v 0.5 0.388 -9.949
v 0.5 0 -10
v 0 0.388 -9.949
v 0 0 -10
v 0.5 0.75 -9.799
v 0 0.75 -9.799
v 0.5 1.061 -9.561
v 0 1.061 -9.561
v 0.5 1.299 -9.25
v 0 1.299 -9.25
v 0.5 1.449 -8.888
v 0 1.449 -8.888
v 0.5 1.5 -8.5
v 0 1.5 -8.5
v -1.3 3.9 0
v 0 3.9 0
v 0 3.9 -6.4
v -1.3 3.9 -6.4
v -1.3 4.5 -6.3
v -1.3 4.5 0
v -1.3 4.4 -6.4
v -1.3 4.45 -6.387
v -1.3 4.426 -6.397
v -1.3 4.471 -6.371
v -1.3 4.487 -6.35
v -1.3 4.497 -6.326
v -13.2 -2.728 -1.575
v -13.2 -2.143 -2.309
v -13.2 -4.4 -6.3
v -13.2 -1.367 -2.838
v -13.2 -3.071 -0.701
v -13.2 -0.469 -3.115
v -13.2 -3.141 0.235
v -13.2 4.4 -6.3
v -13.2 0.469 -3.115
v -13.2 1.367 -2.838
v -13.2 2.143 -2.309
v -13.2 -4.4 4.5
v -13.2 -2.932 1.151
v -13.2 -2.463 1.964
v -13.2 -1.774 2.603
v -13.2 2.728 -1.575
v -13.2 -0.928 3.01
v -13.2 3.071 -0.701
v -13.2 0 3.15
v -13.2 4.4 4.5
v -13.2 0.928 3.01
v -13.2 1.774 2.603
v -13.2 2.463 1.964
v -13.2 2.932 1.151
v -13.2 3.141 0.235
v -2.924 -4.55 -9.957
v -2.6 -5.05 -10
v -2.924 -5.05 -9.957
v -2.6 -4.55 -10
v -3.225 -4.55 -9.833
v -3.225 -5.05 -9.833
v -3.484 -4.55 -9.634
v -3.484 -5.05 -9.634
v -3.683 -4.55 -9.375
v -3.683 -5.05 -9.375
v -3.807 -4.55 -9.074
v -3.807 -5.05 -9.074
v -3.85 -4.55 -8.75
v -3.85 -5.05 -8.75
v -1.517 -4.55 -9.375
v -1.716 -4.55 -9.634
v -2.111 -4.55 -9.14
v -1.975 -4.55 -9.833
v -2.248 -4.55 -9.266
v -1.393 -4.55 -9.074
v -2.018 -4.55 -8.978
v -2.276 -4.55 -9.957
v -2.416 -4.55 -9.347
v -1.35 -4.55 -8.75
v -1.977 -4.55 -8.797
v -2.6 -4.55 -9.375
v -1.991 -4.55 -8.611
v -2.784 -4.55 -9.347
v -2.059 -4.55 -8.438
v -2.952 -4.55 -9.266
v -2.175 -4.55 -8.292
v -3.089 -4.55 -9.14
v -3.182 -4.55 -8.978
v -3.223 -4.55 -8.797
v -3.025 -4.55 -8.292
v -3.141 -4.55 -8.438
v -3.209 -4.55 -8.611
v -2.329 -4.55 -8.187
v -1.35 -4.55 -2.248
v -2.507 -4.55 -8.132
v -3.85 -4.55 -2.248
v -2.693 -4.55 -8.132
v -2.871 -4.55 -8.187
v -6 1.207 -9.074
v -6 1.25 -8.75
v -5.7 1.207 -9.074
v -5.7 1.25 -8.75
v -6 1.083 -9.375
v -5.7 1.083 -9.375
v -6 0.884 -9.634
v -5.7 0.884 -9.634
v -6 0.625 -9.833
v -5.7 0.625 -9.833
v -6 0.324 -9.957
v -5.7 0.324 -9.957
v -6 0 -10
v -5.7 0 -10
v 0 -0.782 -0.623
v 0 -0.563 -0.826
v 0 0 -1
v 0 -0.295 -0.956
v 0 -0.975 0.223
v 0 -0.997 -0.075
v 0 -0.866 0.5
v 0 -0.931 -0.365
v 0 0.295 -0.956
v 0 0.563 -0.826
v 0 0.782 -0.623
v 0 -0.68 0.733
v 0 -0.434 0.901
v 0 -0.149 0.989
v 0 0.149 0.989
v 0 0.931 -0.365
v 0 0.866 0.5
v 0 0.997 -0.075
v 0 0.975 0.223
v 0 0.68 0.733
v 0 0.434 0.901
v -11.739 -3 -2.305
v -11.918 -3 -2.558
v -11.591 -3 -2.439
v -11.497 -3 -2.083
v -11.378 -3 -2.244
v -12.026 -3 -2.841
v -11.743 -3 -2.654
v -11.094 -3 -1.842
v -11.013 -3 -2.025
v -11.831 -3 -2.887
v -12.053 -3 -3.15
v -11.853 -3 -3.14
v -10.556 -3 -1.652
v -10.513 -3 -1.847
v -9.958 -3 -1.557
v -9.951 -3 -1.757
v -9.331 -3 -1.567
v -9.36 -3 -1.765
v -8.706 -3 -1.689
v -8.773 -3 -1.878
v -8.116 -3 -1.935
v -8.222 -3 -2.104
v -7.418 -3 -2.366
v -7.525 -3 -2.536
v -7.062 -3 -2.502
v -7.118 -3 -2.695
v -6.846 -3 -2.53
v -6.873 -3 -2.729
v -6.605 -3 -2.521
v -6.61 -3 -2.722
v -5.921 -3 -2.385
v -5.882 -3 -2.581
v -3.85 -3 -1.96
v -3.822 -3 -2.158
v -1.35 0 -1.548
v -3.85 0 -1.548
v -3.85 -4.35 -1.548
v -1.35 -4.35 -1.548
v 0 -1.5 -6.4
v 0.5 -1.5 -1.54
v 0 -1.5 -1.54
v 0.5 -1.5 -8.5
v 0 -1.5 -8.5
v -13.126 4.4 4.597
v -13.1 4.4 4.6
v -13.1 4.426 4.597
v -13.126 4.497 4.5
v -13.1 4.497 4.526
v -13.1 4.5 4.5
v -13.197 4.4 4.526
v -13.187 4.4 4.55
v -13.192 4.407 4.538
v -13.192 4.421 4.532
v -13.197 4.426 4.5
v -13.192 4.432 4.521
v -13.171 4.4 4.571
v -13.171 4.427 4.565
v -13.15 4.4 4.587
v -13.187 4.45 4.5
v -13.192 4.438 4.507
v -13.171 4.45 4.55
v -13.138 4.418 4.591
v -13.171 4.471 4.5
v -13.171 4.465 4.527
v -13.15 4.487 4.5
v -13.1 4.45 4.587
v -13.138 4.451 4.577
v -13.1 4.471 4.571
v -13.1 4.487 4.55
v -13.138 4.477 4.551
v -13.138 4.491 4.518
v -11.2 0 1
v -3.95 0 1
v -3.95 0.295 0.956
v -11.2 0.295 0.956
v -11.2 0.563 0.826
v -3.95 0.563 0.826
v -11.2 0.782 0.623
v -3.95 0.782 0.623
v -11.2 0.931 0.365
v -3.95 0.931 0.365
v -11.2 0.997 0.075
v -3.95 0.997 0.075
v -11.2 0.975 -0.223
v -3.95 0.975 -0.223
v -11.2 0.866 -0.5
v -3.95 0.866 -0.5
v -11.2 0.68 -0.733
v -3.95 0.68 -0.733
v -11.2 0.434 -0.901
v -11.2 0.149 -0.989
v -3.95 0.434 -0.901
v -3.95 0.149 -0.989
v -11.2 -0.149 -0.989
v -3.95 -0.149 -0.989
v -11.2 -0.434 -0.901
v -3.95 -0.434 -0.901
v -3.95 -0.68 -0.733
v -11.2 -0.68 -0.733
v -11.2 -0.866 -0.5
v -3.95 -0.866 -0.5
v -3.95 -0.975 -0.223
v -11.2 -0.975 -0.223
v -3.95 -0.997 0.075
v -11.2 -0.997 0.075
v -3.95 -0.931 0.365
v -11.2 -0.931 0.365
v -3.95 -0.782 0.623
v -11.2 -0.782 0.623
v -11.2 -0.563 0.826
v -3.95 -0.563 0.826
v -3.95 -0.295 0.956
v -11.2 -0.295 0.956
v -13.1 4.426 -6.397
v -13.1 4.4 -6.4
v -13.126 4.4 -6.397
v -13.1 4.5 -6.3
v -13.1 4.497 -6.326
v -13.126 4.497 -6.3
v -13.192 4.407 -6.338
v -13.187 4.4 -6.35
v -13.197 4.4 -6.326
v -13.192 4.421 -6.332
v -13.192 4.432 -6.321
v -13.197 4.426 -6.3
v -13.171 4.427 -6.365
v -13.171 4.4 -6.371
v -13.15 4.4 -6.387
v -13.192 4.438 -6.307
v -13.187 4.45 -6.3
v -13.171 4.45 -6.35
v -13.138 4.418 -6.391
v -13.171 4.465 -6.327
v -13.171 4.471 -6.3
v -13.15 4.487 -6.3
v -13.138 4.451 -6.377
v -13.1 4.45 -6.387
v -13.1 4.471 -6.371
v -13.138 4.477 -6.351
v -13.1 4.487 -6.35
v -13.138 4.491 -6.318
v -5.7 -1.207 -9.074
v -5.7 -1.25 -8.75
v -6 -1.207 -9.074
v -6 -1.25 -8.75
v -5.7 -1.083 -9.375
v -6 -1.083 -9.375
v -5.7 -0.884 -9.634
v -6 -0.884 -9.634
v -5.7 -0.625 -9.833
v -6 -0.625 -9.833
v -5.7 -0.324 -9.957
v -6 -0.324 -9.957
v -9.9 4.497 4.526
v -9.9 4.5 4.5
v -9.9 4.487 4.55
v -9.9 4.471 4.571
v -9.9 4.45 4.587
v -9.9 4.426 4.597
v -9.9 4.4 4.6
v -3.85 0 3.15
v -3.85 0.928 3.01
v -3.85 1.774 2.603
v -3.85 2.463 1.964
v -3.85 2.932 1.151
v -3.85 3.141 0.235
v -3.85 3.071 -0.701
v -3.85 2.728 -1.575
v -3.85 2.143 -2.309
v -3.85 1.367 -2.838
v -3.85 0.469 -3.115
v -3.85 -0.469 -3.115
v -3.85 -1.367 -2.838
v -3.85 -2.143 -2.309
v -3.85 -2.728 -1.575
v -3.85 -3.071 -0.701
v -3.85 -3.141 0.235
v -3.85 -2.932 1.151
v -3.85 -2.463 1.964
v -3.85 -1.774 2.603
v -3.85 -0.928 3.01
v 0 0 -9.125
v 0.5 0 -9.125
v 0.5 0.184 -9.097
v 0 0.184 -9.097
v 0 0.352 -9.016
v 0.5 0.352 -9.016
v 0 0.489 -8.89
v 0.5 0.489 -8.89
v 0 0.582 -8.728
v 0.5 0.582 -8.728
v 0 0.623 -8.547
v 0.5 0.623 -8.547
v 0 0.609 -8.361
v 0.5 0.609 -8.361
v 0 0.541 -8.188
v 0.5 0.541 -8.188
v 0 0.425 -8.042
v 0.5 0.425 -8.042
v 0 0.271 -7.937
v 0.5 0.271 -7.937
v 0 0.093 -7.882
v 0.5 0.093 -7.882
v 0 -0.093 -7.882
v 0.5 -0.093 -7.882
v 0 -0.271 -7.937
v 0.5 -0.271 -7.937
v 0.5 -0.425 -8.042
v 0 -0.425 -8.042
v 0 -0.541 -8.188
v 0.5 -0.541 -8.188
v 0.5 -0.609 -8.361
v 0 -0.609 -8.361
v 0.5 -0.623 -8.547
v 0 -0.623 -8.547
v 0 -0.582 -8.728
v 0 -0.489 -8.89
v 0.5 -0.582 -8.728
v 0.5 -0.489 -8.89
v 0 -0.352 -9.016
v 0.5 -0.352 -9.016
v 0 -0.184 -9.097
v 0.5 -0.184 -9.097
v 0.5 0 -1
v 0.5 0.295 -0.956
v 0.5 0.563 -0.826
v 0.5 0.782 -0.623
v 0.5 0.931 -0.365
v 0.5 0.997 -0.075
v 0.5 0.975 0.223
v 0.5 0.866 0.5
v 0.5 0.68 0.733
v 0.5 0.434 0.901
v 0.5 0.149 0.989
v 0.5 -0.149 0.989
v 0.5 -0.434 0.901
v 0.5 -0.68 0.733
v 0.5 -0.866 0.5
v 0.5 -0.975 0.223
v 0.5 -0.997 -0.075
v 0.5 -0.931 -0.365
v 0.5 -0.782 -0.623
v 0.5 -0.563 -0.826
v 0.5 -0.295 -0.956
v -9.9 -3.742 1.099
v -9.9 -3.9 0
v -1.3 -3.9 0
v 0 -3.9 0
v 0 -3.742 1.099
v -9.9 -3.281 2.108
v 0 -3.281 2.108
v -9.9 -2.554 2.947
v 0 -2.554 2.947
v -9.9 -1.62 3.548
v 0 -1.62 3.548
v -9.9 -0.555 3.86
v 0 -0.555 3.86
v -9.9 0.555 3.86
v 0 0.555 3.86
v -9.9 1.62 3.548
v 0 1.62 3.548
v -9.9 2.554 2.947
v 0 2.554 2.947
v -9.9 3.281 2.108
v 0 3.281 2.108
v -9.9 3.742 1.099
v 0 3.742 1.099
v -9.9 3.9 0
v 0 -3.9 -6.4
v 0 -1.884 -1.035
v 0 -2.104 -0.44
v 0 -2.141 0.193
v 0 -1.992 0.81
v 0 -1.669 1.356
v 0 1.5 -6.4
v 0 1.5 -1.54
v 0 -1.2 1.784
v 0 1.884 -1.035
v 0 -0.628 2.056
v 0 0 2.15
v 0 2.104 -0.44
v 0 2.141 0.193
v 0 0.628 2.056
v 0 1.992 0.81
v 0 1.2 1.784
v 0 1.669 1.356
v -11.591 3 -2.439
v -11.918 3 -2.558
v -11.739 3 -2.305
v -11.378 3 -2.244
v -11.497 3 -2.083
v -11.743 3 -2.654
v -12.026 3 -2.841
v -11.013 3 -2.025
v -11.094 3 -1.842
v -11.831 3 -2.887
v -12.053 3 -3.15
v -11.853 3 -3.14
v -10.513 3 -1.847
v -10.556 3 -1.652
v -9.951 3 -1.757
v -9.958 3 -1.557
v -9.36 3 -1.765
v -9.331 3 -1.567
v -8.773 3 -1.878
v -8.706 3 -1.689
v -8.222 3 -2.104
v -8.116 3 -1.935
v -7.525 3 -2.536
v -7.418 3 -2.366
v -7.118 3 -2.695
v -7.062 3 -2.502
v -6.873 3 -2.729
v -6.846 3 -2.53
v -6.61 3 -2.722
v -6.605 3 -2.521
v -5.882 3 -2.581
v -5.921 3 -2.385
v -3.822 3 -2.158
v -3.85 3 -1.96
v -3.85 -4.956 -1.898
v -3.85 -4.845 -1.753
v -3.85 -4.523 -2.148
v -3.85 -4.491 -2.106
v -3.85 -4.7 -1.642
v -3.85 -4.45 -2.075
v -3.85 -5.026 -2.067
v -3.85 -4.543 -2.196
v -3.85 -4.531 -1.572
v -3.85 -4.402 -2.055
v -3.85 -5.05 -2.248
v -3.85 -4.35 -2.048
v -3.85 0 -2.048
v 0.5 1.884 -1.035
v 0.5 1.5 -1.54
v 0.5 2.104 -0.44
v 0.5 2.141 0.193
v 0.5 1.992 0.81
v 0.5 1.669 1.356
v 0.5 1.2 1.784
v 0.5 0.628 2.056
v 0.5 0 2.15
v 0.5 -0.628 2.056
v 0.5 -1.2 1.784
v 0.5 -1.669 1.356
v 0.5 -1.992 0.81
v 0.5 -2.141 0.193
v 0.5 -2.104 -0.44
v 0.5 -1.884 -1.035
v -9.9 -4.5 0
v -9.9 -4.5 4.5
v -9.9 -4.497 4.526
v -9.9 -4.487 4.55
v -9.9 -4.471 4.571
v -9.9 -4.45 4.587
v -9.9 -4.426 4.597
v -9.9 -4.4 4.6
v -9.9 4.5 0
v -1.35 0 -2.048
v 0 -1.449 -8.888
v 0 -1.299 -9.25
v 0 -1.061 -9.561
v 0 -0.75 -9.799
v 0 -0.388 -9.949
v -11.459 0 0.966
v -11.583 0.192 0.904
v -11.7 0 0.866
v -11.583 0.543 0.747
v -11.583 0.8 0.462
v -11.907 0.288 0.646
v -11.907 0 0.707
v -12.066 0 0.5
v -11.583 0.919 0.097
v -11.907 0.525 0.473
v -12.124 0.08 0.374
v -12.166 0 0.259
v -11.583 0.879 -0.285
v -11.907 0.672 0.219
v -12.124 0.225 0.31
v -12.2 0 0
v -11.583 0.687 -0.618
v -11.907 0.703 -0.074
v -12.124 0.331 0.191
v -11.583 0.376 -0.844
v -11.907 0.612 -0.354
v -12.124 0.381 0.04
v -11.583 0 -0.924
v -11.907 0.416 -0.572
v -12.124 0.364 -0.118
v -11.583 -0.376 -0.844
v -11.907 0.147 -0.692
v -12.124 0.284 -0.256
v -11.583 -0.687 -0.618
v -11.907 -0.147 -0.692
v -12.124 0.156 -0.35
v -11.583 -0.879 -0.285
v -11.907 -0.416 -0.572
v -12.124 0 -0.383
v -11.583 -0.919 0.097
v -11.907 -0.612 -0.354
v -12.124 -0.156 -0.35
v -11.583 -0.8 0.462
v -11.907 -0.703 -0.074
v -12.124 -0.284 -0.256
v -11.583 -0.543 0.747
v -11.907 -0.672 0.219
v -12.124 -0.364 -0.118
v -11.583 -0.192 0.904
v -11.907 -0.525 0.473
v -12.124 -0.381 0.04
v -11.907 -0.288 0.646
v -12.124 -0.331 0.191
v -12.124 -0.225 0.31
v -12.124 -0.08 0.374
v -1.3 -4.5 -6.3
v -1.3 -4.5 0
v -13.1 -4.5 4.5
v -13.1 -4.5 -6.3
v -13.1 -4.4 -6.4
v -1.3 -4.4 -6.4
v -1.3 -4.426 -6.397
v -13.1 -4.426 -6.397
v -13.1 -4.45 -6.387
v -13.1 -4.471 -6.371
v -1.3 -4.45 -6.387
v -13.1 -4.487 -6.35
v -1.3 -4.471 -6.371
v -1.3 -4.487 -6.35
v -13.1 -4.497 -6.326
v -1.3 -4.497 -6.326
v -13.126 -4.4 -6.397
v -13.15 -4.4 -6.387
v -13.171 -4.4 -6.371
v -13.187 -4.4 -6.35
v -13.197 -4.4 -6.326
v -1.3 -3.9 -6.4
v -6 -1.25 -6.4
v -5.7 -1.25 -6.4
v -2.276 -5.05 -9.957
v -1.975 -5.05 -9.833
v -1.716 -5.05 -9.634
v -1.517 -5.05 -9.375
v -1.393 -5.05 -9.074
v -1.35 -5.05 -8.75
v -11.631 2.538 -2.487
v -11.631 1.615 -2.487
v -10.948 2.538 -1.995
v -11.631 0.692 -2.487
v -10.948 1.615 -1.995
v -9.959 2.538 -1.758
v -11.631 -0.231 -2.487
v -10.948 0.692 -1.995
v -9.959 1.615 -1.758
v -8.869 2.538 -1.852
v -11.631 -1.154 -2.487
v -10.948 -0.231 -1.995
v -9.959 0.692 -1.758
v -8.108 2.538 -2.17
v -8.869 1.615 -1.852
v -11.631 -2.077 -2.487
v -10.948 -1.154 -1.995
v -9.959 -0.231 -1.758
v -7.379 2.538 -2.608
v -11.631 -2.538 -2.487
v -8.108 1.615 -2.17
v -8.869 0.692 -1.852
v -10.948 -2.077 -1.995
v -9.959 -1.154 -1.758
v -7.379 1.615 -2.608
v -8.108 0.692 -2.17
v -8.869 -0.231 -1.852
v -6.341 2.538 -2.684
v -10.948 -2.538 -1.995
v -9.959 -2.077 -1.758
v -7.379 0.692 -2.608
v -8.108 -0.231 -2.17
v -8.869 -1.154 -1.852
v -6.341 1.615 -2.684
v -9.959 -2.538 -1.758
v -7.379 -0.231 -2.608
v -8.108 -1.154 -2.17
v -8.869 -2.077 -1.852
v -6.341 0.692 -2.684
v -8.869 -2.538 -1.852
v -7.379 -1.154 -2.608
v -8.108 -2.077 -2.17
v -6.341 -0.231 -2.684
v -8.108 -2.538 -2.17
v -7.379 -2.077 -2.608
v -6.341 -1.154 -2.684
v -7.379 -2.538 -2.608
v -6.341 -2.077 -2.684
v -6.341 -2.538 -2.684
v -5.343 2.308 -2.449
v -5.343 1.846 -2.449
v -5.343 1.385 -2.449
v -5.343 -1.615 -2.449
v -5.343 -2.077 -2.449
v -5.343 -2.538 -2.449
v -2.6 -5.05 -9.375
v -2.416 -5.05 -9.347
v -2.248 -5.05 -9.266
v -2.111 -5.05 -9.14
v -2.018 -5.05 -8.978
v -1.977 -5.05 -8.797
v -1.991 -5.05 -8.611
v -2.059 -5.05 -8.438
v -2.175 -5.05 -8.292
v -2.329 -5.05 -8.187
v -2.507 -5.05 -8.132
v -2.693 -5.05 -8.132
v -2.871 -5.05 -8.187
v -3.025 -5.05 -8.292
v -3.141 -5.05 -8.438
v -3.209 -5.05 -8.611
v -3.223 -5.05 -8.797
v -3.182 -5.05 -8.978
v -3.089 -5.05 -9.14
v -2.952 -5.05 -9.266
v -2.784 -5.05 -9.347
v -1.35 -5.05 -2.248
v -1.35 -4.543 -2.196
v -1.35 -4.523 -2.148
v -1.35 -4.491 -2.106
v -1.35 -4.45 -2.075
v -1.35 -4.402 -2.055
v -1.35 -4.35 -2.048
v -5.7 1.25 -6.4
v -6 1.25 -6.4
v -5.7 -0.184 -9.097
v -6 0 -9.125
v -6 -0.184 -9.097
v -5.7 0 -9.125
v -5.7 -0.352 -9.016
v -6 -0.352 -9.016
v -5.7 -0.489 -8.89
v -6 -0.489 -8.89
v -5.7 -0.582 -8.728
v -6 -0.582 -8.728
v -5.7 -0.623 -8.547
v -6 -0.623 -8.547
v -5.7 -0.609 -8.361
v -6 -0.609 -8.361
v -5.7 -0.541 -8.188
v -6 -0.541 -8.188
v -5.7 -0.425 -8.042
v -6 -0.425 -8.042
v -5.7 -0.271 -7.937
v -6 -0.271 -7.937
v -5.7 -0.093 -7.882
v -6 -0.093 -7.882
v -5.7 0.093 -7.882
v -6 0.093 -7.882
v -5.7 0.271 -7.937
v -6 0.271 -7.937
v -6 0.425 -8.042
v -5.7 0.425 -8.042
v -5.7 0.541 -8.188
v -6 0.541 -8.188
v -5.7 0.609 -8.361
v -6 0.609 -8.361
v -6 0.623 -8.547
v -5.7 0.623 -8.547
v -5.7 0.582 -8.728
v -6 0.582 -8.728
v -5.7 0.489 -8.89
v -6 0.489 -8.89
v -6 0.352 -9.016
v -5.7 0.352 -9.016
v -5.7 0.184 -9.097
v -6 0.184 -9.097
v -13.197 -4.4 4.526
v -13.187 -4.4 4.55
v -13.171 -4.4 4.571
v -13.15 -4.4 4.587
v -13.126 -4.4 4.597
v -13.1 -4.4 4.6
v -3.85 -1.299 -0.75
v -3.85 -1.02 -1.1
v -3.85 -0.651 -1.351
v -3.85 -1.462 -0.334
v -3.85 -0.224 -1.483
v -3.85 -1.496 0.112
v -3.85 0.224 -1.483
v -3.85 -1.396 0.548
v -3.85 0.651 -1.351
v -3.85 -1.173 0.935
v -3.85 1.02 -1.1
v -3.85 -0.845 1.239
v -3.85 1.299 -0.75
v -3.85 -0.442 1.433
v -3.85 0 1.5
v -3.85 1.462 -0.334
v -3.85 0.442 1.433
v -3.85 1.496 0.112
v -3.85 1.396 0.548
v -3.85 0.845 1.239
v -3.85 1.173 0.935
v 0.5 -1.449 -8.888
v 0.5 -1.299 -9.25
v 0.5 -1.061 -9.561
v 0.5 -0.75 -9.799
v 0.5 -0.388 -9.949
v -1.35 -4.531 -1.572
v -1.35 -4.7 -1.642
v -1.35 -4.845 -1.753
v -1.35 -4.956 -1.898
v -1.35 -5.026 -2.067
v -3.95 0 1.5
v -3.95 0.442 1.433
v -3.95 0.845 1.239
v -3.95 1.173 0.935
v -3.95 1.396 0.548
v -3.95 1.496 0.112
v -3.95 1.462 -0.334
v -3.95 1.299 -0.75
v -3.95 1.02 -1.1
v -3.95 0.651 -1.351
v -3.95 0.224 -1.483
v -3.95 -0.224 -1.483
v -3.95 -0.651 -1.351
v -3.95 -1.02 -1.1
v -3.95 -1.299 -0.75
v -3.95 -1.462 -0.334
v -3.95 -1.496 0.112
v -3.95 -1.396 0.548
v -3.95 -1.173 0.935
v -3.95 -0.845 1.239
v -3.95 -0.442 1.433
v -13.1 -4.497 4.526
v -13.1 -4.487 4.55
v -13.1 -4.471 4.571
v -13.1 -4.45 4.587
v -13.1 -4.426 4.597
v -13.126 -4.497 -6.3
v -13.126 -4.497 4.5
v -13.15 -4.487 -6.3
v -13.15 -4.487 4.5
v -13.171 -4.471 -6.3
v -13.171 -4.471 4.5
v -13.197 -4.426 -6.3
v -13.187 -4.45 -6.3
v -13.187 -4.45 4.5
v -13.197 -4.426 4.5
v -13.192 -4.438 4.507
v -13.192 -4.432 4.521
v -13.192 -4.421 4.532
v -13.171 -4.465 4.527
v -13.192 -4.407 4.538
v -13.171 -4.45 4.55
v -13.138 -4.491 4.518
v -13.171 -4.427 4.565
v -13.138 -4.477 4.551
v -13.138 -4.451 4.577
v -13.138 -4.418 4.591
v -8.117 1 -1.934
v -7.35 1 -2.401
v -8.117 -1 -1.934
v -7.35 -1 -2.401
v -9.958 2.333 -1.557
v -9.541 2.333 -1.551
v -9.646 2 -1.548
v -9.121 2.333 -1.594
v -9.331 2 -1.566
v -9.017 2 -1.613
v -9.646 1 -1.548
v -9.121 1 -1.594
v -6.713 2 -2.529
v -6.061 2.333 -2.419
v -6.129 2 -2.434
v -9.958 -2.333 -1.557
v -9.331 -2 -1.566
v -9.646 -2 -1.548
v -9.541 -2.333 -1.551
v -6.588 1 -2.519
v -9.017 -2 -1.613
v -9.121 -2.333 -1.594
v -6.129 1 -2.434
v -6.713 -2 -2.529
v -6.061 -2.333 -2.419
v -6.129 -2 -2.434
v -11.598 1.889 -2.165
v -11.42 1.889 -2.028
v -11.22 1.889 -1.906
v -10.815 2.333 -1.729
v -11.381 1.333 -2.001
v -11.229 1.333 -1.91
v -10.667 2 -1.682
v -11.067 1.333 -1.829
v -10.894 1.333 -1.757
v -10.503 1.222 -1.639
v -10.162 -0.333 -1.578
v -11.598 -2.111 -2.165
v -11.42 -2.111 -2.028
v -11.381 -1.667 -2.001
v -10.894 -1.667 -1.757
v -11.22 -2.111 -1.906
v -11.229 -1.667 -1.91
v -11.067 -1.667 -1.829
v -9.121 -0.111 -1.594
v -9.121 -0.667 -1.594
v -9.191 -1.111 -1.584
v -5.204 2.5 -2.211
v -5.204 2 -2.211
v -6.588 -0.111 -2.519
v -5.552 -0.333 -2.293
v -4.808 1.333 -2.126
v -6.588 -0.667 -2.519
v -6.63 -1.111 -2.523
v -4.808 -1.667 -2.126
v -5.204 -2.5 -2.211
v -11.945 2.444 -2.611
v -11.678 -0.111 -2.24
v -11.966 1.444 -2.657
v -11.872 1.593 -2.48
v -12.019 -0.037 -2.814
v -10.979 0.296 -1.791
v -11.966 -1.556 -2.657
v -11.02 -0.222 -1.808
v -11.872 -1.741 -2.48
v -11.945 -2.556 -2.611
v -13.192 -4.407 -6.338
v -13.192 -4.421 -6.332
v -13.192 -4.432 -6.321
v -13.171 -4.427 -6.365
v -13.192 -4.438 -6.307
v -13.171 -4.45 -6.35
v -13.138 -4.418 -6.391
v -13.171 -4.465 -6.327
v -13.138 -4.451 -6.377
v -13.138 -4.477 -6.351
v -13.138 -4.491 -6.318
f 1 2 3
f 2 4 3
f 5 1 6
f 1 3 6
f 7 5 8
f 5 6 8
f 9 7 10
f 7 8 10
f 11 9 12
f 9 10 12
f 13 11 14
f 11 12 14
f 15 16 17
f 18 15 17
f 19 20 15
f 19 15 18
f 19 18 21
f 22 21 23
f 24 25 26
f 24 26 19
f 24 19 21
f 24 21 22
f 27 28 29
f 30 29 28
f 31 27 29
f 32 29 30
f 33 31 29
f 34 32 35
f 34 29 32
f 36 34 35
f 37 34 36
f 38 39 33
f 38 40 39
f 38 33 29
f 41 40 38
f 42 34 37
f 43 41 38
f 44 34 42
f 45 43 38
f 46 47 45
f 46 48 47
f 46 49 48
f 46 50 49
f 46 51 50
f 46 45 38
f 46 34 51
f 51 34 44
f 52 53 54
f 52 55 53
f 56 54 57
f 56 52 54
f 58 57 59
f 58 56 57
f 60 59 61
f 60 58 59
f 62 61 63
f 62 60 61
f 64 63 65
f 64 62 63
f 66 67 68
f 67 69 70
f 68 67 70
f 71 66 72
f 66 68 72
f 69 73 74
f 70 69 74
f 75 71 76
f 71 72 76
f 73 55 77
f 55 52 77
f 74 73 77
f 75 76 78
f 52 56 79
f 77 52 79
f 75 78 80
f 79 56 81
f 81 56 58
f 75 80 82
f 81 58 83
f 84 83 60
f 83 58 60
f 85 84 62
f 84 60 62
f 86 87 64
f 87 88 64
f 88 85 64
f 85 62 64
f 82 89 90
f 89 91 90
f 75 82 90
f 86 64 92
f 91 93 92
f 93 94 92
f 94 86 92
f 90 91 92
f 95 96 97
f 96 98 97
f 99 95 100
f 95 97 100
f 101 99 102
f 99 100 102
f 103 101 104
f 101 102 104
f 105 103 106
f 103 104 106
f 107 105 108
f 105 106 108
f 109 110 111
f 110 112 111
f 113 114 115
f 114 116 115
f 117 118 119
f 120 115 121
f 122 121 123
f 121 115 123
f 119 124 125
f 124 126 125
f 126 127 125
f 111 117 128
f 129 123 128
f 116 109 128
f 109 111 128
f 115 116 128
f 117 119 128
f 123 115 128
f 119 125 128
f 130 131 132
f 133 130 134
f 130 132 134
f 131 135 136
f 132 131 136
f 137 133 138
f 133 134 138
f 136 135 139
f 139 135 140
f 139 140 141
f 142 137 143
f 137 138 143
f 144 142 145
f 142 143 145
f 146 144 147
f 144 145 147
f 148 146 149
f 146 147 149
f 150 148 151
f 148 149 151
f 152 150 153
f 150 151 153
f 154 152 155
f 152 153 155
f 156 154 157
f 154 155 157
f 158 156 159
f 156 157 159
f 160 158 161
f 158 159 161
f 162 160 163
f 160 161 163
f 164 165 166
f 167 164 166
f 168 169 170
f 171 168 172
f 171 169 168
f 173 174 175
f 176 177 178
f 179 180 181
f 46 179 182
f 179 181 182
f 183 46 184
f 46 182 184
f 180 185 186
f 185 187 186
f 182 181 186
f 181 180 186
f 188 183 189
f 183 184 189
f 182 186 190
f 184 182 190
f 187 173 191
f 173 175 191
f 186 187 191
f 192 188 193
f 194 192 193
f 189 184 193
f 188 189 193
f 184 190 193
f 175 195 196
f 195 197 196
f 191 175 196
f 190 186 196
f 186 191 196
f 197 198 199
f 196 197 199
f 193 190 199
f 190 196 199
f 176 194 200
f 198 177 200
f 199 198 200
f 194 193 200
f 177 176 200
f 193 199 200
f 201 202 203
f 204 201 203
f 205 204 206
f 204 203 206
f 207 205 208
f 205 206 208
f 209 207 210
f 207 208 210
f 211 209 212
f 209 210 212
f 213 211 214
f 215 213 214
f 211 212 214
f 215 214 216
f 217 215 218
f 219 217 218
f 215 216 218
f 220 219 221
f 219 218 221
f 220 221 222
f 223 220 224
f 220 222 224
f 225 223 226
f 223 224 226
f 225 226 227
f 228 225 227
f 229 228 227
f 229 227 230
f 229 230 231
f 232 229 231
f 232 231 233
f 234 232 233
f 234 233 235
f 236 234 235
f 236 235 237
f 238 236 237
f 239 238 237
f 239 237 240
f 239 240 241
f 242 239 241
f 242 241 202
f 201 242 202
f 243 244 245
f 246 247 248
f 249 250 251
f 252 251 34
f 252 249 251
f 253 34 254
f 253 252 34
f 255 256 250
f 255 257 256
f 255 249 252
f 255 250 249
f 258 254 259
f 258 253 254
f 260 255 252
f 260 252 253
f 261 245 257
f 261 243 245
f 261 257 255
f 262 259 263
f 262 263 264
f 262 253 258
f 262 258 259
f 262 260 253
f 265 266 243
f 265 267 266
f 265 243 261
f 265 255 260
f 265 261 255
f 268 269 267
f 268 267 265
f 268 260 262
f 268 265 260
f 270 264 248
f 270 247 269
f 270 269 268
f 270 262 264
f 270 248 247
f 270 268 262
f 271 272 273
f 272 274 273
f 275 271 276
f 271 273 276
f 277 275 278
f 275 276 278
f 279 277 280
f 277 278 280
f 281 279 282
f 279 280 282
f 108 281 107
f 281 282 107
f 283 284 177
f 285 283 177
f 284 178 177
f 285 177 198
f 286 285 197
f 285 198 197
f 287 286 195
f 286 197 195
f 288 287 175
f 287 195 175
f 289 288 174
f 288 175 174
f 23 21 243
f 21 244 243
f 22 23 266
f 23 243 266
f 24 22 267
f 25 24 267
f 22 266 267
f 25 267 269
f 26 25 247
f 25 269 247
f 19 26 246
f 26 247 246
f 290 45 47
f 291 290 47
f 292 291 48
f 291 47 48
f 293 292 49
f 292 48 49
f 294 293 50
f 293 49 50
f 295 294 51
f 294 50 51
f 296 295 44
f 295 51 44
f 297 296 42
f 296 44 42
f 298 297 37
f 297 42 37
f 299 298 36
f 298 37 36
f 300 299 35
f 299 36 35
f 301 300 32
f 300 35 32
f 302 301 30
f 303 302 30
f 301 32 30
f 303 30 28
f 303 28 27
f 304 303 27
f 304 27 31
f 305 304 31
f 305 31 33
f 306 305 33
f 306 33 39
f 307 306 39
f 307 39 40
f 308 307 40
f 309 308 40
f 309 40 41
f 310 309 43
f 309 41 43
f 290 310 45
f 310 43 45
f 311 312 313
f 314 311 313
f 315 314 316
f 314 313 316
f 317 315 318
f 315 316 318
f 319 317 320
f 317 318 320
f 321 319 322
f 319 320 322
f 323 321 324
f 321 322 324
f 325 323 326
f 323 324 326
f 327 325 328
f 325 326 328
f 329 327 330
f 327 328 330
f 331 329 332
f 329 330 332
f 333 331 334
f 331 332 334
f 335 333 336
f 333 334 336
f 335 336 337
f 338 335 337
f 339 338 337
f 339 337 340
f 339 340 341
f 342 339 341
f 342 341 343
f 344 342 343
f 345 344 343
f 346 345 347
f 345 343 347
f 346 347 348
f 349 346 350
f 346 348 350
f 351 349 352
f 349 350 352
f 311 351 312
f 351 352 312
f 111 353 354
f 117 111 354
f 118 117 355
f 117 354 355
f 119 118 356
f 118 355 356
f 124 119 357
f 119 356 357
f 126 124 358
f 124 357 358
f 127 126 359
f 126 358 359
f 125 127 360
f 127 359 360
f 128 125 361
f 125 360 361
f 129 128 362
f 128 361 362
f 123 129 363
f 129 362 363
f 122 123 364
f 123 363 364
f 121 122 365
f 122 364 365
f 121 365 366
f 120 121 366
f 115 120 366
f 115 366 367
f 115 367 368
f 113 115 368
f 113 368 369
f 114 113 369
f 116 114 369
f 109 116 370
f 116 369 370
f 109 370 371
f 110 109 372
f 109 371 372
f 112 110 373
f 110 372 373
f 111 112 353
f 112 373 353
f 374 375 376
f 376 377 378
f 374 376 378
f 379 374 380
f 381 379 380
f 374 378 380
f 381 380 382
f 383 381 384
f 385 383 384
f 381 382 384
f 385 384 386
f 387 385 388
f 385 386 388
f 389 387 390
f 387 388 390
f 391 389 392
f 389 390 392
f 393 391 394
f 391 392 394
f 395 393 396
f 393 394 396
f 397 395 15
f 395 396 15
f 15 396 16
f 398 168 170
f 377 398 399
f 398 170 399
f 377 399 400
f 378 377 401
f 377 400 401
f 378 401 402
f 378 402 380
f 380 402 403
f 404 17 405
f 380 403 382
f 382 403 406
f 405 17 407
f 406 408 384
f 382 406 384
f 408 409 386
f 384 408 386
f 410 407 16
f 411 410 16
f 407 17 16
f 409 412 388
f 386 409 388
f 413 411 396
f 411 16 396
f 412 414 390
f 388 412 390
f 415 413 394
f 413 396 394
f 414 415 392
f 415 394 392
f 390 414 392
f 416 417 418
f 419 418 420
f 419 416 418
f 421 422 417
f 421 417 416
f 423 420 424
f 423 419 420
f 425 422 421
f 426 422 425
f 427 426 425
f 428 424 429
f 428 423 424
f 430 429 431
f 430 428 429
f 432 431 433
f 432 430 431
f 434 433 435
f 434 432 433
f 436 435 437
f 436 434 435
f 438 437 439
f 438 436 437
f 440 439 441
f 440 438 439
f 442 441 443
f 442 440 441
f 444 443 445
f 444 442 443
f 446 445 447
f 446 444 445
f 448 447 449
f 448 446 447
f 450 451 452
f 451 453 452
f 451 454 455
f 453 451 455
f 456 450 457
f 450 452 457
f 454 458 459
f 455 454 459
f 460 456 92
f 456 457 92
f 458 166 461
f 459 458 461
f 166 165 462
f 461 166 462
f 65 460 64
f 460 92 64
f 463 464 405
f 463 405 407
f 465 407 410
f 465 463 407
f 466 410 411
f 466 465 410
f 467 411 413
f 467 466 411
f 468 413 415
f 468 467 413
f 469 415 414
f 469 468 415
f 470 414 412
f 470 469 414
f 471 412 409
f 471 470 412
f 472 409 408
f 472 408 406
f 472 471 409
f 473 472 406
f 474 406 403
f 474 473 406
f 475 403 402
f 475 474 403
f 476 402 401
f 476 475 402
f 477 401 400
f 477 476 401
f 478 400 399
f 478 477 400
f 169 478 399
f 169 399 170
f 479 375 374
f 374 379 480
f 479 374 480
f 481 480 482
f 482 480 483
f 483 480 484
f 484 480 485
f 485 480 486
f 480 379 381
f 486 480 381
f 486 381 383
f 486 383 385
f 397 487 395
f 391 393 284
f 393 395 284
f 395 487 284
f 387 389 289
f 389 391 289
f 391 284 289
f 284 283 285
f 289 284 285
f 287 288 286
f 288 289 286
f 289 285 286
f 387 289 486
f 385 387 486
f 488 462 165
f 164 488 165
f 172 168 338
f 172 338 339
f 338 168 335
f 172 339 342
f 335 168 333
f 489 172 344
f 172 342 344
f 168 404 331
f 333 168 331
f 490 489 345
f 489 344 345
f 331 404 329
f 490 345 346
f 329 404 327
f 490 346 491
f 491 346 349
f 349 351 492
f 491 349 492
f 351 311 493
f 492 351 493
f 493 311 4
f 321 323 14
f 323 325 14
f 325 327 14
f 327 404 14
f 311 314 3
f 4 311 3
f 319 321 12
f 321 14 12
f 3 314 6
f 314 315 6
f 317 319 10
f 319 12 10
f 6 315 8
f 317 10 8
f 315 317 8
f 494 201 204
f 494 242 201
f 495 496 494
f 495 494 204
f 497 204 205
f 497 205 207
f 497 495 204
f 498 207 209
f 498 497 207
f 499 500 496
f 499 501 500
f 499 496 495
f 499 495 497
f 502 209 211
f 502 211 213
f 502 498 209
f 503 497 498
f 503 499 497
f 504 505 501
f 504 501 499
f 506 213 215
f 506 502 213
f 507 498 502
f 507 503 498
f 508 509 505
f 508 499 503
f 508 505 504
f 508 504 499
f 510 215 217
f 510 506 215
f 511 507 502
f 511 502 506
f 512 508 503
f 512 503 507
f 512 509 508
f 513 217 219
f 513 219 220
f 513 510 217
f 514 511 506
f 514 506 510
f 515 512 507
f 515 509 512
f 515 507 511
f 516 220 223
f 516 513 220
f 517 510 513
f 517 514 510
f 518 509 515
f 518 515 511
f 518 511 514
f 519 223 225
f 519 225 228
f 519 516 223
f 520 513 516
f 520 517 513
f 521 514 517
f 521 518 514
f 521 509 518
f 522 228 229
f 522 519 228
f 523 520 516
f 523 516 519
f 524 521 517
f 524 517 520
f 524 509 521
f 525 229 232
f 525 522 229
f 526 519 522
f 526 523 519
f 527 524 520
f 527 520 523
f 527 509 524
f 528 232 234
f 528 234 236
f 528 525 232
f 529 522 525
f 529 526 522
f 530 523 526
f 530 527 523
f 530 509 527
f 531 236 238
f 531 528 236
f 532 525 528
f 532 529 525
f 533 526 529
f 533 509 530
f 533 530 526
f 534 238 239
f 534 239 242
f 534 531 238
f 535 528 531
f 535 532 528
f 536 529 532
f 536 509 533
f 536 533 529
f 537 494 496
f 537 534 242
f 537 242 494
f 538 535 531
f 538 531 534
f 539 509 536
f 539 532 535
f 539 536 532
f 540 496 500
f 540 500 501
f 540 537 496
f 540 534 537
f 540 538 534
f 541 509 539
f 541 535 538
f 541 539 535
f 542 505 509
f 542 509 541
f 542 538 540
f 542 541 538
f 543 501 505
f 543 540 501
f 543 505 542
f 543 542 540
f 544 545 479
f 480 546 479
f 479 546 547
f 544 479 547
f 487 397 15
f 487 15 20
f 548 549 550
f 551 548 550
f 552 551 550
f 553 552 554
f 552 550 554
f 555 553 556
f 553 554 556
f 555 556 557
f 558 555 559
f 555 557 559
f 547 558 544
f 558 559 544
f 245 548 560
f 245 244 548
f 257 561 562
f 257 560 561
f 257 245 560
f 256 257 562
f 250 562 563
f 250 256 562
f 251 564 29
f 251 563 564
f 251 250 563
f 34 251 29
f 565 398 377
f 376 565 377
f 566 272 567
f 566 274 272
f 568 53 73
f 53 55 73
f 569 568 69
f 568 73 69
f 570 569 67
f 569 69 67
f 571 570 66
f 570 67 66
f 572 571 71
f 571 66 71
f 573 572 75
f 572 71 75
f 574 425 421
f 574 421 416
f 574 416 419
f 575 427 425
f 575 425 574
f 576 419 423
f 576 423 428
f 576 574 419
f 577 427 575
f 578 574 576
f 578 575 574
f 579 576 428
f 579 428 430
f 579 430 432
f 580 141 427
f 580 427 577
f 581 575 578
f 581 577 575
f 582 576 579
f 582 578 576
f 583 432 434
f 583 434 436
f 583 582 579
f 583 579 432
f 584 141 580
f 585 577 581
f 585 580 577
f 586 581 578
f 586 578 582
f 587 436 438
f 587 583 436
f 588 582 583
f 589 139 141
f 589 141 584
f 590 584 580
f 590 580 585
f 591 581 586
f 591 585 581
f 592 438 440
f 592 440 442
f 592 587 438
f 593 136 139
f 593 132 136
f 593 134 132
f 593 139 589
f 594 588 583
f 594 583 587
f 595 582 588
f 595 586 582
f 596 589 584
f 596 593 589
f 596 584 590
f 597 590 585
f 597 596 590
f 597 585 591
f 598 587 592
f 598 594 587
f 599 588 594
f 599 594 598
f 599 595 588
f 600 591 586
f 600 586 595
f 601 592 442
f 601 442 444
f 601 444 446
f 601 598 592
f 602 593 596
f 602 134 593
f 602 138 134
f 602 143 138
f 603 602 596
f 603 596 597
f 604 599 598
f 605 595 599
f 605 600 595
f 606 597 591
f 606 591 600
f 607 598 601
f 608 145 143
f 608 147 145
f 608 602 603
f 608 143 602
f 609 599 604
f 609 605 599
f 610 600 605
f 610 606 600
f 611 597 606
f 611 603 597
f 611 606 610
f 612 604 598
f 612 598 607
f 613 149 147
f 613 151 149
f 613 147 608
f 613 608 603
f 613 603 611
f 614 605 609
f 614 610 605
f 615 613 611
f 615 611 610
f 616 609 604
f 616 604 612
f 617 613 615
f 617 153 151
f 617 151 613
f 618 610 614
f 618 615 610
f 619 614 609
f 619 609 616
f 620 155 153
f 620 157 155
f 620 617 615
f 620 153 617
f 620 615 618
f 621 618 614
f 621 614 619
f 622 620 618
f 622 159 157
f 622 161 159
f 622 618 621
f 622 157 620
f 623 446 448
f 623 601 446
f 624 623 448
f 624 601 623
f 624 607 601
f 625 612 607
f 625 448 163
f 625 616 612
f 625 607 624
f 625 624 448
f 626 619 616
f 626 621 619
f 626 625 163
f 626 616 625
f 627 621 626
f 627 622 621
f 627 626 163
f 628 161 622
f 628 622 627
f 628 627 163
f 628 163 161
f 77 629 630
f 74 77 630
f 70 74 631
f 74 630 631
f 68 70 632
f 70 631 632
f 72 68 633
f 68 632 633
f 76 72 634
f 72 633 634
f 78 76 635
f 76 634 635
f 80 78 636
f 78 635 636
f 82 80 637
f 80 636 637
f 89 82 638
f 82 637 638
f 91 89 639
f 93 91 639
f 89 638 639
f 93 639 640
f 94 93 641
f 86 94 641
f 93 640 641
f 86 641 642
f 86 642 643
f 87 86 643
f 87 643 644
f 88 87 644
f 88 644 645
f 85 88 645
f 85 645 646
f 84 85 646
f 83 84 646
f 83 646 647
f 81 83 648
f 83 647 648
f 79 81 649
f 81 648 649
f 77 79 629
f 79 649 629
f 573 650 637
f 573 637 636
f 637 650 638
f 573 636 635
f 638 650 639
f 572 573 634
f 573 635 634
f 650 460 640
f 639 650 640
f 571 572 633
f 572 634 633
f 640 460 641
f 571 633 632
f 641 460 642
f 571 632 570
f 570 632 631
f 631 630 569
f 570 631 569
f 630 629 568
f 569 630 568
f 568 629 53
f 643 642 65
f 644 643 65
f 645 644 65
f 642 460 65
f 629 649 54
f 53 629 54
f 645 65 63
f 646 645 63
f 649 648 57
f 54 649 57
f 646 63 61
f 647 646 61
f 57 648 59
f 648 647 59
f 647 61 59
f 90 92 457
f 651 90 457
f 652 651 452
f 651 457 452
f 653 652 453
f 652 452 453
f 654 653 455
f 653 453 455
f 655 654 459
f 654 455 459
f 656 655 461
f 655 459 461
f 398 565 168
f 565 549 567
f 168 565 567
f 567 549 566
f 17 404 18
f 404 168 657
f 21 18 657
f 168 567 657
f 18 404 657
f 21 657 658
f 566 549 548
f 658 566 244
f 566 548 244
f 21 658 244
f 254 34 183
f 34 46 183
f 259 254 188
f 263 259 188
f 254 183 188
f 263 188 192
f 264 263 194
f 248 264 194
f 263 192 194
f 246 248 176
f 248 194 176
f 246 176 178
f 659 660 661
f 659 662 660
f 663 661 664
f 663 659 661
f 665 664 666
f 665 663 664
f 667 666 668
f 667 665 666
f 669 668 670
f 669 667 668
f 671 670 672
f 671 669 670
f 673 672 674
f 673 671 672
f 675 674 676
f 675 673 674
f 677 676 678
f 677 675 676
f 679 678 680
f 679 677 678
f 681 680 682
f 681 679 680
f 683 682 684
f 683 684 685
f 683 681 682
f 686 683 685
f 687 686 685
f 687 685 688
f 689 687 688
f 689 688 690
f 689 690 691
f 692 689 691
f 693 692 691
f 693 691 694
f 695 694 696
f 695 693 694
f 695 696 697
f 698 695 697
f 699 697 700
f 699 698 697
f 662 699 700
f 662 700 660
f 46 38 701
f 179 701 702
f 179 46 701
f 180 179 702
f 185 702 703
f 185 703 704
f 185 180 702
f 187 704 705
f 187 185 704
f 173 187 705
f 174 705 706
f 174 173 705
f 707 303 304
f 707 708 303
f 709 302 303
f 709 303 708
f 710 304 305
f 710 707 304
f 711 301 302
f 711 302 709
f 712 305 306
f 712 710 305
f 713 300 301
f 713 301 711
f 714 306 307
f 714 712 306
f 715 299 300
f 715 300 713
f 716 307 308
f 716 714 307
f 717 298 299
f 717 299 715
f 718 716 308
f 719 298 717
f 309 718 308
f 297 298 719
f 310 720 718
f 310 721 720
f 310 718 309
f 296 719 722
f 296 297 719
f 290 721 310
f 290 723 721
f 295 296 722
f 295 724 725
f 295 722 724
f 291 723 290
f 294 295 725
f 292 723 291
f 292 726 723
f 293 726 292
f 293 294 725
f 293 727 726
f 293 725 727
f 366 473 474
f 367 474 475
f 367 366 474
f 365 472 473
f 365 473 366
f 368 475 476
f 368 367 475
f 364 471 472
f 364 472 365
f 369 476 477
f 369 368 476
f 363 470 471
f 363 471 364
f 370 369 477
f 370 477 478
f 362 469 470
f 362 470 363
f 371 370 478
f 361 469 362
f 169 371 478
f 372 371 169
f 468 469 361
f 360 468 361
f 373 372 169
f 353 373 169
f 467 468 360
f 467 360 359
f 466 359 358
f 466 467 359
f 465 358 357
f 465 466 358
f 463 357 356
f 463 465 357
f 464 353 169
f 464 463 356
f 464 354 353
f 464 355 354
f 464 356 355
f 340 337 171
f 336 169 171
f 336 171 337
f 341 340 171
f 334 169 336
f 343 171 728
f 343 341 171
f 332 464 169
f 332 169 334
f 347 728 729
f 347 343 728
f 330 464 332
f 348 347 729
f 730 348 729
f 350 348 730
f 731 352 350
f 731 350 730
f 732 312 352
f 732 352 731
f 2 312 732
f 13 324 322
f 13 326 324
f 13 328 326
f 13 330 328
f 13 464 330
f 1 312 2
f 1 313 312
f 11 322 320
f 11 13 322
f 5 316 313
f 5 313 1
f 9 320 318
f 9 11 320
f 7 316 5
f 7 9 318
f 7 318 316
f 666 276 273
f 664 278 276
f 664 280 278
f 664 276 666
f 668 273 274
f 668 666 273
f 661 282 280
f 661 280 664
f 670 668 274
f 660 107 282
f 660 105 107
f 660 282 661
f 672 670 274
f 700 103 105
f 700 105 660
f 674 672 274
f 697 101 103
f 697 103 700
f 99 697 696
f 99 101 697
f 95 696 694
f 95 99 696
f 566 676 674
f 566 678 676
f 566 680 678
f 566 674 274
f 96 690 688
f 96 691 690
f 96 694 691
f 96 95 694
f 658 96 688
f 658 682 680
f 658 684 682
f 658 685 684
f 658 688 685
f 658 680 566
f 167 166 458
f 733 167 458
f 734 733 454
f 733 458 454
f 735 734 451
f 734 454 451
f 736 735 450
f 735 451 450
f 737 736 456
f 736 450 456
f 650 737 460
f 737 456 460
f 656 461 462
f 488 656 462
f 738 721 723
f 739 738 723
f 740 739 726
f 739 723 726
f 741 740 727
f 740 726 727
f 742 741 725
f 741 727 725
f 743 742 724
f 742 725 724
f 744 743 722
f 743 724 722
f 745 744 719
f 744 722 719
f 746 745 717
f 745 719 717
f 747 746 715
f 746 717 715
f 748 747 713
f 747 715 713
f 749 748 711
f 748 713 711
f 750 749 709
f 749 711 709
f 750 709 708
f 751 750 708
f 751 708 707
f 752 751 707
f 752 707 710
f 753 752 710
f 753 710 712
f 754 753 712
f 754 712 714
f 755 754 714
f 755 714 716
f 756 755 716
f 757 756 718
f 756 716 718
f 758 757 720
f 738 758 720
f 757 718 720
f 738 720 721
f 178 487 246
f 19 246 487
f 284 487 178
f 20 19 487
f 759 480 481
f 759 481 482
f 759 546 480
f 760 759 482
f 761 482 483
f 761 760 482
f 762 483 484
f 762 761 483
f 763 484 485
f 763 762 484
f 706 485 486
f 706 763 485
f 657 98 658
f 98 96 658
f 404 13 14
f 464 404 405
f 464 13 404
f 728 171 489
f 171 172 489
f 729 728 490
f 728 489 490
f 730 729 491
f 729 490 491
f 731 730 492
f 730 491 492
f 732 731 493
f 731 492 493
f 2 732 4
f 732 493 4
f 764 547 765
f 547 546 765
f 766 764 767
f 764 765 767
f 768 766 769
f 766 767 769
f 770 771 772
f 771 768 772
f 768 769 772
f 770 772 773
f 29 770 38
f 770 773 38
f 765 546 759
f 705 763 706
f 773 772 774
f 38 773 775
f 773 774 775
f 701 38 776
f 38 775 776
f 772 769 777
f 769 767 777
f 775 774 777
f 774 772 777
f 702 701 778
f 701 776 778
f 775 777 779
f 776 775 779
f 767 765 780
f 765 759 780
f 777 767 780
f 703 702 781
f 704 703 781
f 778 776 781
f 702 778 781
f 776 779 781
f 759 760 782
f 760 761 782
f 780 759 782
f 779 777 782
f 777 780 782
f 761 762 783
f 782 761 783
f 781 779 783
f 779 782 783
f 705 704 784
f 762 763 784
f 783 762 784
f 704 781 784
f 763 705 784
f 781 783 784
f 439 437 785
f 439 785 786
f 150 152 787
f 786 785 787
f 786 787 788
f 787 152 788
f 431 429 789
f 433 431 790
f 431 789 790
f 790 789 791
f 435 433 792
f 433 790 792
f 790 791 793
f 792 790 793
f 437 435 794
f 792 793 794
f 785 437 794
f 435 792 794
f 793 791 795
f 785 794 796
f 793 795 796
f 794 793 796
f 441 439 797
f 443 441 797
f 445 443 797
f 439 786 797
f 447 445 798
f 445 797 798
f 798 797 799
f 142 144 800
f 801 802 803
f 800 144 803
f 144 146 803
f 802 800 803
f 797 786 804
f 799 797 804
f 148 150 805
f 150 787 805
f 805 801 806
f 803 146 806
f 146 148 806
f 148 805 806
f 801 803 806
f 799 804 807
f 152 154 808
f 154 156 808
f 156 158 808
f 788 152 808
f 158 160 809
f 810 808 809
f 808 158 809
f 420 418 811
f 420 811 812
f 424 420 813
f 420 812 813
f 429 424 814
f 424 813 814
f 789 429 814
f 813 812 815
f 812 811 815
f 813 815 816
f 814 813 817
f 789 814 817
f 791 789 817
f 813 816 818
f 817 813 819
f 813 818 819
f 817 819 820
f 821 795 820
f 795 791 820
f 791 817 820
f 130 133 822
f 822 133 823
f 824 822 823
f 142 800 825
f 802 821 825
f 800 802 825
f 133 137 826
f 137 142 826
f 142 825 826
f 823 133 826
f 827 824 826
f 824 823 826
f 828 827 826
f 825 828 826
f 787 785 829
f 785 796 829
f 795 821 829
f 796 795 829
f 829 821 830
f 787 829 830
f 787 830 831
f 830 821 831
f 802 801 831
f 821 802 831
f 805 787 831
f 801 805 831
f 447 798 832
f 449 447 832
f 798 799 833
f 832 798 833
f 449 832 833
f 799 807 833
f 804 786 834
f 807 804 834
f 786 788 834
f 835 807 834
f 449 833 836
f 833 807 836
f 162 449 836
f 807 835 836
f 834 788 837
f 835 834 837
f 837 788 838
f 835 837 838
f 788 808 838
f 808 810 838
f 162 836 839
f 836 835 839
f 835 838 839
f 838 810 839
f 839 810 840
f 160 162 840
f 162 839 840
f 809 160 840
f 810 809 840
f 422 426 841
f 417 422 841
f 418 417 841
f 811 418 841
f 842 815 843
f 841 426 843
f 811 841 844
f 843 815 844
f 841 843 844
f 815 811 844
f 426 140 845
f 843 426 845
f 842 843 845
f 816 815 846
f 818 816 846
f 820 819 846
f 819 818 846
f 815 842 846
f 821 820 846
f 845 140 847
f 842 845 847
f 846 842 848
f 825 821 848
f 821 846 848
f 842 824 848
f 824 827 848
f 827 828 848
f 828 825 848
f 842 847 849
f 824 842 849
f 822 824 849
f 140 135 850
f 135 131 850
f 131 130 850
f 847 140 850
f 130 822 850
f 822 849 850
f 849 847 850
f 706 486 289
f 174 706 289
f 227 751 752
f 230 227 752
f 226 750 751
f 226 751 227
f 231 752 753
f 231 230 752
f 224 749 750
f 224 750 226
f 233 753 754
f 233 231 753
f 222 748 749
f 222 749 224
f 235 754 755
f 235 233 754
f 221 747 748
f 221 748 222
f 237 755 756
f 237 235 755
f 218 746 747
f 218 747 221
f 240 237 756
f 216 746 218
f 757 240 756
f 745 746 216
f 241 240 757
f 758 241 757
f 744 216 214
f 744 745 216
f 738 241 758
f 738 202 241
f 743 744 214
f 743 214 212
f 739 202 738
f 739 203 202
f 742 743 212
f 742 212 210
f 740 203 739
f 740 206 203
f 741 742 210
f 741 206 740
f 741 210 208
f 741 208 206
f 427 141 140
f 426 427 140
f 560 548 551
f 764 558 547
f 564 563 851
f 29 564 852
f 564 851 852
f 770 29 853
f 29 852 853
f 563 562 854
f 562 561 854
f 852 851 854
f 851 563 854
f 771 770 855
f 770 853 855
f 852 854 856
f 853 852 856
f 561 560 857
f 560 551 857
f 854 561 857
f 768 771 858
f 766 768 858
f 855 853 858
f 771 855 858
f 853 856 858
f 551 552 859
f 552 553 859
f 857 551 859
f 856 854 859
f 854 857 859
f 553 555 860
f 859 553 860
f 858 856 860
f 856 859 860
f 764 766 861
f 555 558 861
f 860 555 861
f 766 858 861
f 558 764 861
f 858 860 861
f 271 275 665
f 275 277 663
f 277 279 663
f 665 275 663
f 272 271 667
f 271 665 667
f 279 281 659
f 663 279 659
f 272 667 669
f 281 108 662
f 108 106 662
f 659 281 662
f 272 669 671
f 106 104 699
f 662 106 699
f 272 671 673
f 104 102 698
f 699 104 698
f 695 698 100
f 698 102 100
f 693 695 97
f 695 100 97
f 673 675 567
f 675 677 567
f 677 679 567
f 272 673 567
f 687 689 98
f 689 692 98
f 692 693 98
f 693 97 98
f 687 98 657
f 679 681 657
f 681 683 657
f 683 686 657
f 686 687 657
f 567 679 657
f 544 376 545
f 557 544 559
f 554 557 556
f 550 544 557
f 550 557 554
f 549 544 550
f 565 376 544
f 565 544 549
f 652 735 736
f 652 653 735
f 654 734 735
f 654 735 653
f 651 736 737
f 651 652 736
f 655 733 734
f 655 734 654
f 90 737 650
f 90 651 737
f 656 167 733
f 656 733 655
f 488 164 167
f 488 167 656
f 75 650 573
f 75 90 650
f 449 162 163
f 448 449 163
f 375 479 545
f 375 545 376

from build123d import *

# Parameters (mm, degrees)
BOSS_EXTRUDE2_DEPTH = 9.9
SKETCH2_W           = 11
SKETCH2_H           = 9
BOSS_EXTRUDE3_DEPTH = 3.3
SKETCH4_W           = 6.4
SKETCH4_H           = 9
BOSS_EXTRUDE4_DEPTH = 8.6
SKETCH3_R           = 3.15
CUT_EXTRUDE1_DEPTH  = 9.35
SKETCH6_R           = 1.5
BOSS_EXTRUDE6_DEPTH = 0.1
SKETCH5_R           = 1
BOSS_EXTRUDE5_DEPTH = 8.35
FILLET1_R           = 1
EXTRUDE_THIN2_START = -3
EXTRUDE_THIN2_DEPTH = 6
EXTRUDE_THIN3_DEPTH = 2.5
FILLET2_R           = 1.25
SKETCH9_R           = 0.625
CUT_EXTRUDE2_DEPTH  = 0.5
BOSS_EXTRUDE7_START = 0.5
SKETCH10_R          = 1
BOSS_EXTRUDE7_DEPTH = 0.5
FILLET3_R           = 1.5
SKETCH12_R          = 0.625
CUT_EXTRUDE3_DEPTH  = 0.5
SKETCH13_W          = 3.6
SKETCH13_H          = 2.5
SKETCH13_R          = 0.625
BOSS_EXTRUDE8_DEPTH = 0.15
FILLET4_R           = 1.25
FILLET5_R           = 0.1


# Read off the part's stored shape, not the designer's step: Extrude-Thin2
with BuildPart() as part:
    # Sketch1 → Boss-Extrude2 (new body)
    with BuildSketch(Plane(origin=(0, 0, 0), x_dir=(0, 0, -1), z_dir=(1, 0, 0))):
        with BuildLine():
            Line((0, 3.9), (6.4, 3.9))
            Line((6.4, 3.9), (6.4, -3.9))
            Line((6.4, -3.9), (0, -3.9))
            ThreePointArc((0, -3.9), (-3.9, 0), (0, 3.9))
        make_face()
    extrude(amount=-BOSS_EXTRUDE2_DEPTH)

    # Sketch2 → Boss-Extrude3 (add)
    with BuildSketch(Plane.ZY.offset(9.9)):
        with Locations((-0.9, 0)):
            Rectangle(SKETCH2_W, SKETCH2_H)
    extrude(amount=BOSS_EXTRUDE3_DEPTH)

    # Sketch4 → Boss-Extrude4 (add)
    with BuildSketch(Plane(origin=(-9.9, 0, 0), x_dir=(0, 0, -1), z_dir=(1, 0, 0))):
        with Locations((3.2, 0)):
            Rectangle(SKETCH4_W, SKETCH4_H)
    extrude(amount=BOSS_EXTRUDE4_DEPTH)

    # Sketch3 → Cut-Extrude1 (cut)
    with BuildSketch(Plane.ZY.offset(13.2)):
        Circle(SKETCH3_R)
    extrude(amount=-CUT_EXTRUDE1_DEPTH, mode=Mode.SUBTRACT)

    # Sketch6 → Boss-Extrude6 (add)
    with BuildSketch(Plane.ZY.offset(3.85)):
        Circle(SKETCH6_R)
    extrude(amount=BOSS_EXTRUDE6_DEPTH)

    # Sketch5 → Boss-Extrude5 (add)
    with BuildSketch(Plane.ZY.offset(3.85)):
        Circle(SKETCH5_R)
    extrude(amount=BOSS_EXTRUDE5_DEPTH)

    # Fillet1
    fillet1_edges = [part.edges().sort_by_distance(p)[0] for p in [
        (-12.2, 0, -1),
    ]]
    fillet(fillet1_edges, radius=FILLET1_R)

    # Sketch10 → Boss-Extrude7 (add)
    with BuildSketch(Plane(origin=(0, 0, 0), x_dir=(0, 0, -1), z_dir=(1, 0, 0)).offset(BOSS_EXTRUDE7_START)):
        with BuildLine():
            Line((1.54029218, -1.5), (10, -1.5))
            Line((10, -1.5), (10, 1.5))
            Line((10, 1.5), (1.54029218, 1.5))
            ThreePointArc((1.54029218, 1.5), (-2.15, 0), (1.54029218, -1.5))
        make_face()
        Circle(SKETCH10_R, mode=Mode.SUBTRACT)
    extrude(amount=-BOSS_EXTRUDE7_DEPTH)

    # Fillet3
    fillet3_edges = [part.edges().sort_by_distance(p)[0] for p in [
        (0.25, 1.5, -10),
        (0.25, -1.5, -10),
    ]]
    fillet(fillet3_edges, radius=FILLET3_R - 0.0001)  # a hair under: the kernel refuses the full size

    # Sketch12 → Cut-Extrude3 (cut)
    with BuildSketch(Plane(origin=(0.5, 0, 0), x_dir=(0, 0, -1), z_dir=(1, 0, 0))):
        with Locations((8.5, 0)):
            Circle(SKETCH12_R)
    extrude(amount=-CUT_EXTRUDE3_DEPTH, mode=Mode.SUBTRACT)

    # Sketch13 → Boss-Extrude8 (add, symmetric)
    with BuildSketch(Plane.ZY.offset(5.85)):
        with Locations((-8.2, 0)):
            Rectangle(SKETCH13_W, SKETCH13_H)
        with Locations(Location((-8.5, 0, 0), (0, 0, 180))):
            Circle(SKETCH13_R, mode=Mode.SUBTRACT)
    extrude(amount=BOSS_EXTRUDE8_DEPTH, both=True)

    # Fillet4
    fillet4_edges = [part.edges().sort_by_distance(p)[0] for p in [
        (-5.85, -1.25, -10),
        (-5.85, 1.25, -10),
    ]]
    fillet(fillet4_edges, radius=FILLET4_R - 0.0001)  # a hair under: the kernel refuses the full size

    # Fillet5
    fillet5_edges = [part.edges().sort_by_distance(p)[0] for p in [
        (-7.25, 4.5, -6.4),
        (-7.25, -4.5, -6.4),
        (-11.55, -4.5, 4.6),
        (-11.55, 4.5, 4.6),
        (-13.2, 0, -6.4),
        (-13.2, -4.5, -0.9),
        (-13.2, 0, 4.6),
        (-13.2, 4.5, -0.9),
    ]]
    fillet(fillet5_edges, radius=FILLET5_R)


with BuildPart() as body_2:
    # Extrude-Thin2 outline → Extrude-Thin2 (new body)
    with BuildSketch(Plane(origin=(0, 0, 0), x_dir=(1, 0, 0), z_dir=(0, 1, 0)).offset(EXTRUDE_THIN2_START)):
        with BuildLine():
            Line((-11.853196595, 3.139777961), (-12.052935199, 3.15))
            add(Edge.make_bspline(
                [(-12.052935199, 3.15), (-12.123286013, 1.775345384), (-9.308767384, 0.927202084), (-6.776618422, 2.924902189), (-6.014250042, 2.269230668), (-3.85, 1.960007182)],
                knots=[0, 0, 0, 0, 0.580119449, 0.680119449, 1, 1, 1, 1], degree=3))
            Line((-3.85, 1.960007182), (-3.821711703, 2.157996506))
            add(Edge.make_bspline(
                [(-11.853196595, 3.139777961), (-11.859477381, 3.017051446), (-11.842274614, 2.903305258), (-11.767226527, 2.686882966), (-11.708977162, 2.584036538), (-11.474913838, 2.292548546), (-11.238154332, 2.122105065), (-10.658483363, 1.868304427), (-10.316871729, 1.785011506), (-9.600487173, 1.730478033), (-9.225888583, 1.759065261), (-8.690663906, 1.897746504), (-8.516675338, 1.959877984), (-8.268161931, 2.078097128), (-8.188121436, 2.121674951), (-8.027449957, 2.218254569), (-7.947264051, 2.270521048), (-7.706879907, 2.427876211), (-7.545961857, 2.534742937), (-7.21163312, 2.681472678), (-7.043445259, 2.719717739), (-6.7012668, 2.737373448), (-6.528353372, 2.718205464), (-6.15420317, 2.648908427), (-5.952082723, 2.598615188), (-5.251482723, 2.424847742), (-4.657709278, 2.277442078), (-3.821711703, 2.157996506)],
                knots=[0, 0, 0, 0, 0.0625, 0.0625, 0.125, 0.125, 0.25, 0.25, 0.375, 0.375, 0.5, 0.5, 0.5625, 0.5625, 0.59375, 0.59375, 0.625, 0.625, 0.6875, 0.6875, 0.75, 0.75, 0.8125, 0.8125, 0.875, 0.875, 1, 1, 1, 1], degree=3))
        make_face()
    extrude(amount=EXTRUDE_THIN2_DEPTH)


with BuildPart() as body_3:
    # Sketch8 → Extrude-Thin3 (new body)
    with BuildSketch(Plane.ZY.offset(3.85)):
        with BuildLine():
            Line((-1.547846379, 0), (-1.547846379, -4.35))
            ThreePointArc((-1.547846379, -4.35), (-1.752871632, -4.844974747), (-2.247846379, -5.05))
            Line((-2.247846379, -5.05), (-10, -5.05))
            Line((-10, -5.05), (-10, -4.55))
            Line((-10, -4.55), (-2.247846379, -4.55))
            ThreePointArc((-2.247846379, -4.55), (-2.106425023, -4.491421356), (-2.047846379, -4.35))
            Line((-2.047846379, -4.35), (-2.047846379, 0))
            Line((-2.047846379, 0), (-1.547846379, 0))
        make_face()
    extrude(amount=-EXTRUDE_THIN3_DEPTH)

    # Fillet2
    fillet2_edges = [body_3.edges().sort_by_distance(p)[0] for p in [
        (-1.35, -4.8, -10),
        (-3.85, -4.8, -10),
    ]]
    fillet(fillet2_edges, radius=FILLET2_R - 0.0001)  # a hair under: the kernel refuses the full size

    # Sketch9 → Cut-Extrude2 (cut)
    with BuildSketch(Plane.XZ.offset(5.05)):
        with Locations(Location((-2.6, -8.75, 0), (0, 0, 270))):
            Circle(SKETCH9_R)
    extrude(amount=-CUT_EXTRUDE2_DEPTH, mode=Mode.SUBTRACT)


solid = Compound([part.part, body_2.part, body_3.part])
